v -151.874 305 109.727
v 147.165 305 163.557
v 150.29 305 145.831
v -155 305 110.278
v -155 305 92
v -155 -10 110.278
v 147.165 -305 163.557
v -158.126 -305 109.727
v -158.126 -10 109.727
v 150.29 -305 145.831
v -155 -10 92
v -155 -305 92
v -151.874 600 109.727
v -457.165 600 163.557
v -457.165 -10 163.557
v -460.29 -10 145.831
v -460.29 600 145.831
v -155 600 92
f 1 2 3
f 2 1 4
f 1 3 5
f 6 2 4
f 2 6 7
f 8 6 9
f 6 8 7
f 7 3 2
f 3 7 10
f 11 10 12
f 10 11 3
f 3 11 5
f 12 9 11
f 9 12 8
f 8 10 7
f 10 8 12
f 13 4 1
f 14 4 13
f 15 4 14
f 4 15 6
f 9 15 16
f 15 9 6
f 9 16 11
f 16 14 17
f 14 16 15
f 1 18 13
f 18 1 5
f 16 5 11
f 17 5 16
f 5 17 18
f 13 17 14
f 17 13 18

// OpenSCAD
h=180;
l=600;
d=300;

t_mat=18;

module lid2(lip, open){
    translate([0,0,h/2+t_mat/2+2]){
    
    translate([-(d+lip)/2,-(l+lip)/2,-t_mat/2]){
        rotate([0,-10,0]){
        cube([d+lip,l+lip,t_mat],center=false);
        }
    }
    
    translate([-(d+lip)/2,l,-t_mat/2]){
    rotate([0,-10,180]){
    cube([d+lip,l+lip,t_mat],center=false);
    }
    }
    
    }
}

lid2(10, 0);
